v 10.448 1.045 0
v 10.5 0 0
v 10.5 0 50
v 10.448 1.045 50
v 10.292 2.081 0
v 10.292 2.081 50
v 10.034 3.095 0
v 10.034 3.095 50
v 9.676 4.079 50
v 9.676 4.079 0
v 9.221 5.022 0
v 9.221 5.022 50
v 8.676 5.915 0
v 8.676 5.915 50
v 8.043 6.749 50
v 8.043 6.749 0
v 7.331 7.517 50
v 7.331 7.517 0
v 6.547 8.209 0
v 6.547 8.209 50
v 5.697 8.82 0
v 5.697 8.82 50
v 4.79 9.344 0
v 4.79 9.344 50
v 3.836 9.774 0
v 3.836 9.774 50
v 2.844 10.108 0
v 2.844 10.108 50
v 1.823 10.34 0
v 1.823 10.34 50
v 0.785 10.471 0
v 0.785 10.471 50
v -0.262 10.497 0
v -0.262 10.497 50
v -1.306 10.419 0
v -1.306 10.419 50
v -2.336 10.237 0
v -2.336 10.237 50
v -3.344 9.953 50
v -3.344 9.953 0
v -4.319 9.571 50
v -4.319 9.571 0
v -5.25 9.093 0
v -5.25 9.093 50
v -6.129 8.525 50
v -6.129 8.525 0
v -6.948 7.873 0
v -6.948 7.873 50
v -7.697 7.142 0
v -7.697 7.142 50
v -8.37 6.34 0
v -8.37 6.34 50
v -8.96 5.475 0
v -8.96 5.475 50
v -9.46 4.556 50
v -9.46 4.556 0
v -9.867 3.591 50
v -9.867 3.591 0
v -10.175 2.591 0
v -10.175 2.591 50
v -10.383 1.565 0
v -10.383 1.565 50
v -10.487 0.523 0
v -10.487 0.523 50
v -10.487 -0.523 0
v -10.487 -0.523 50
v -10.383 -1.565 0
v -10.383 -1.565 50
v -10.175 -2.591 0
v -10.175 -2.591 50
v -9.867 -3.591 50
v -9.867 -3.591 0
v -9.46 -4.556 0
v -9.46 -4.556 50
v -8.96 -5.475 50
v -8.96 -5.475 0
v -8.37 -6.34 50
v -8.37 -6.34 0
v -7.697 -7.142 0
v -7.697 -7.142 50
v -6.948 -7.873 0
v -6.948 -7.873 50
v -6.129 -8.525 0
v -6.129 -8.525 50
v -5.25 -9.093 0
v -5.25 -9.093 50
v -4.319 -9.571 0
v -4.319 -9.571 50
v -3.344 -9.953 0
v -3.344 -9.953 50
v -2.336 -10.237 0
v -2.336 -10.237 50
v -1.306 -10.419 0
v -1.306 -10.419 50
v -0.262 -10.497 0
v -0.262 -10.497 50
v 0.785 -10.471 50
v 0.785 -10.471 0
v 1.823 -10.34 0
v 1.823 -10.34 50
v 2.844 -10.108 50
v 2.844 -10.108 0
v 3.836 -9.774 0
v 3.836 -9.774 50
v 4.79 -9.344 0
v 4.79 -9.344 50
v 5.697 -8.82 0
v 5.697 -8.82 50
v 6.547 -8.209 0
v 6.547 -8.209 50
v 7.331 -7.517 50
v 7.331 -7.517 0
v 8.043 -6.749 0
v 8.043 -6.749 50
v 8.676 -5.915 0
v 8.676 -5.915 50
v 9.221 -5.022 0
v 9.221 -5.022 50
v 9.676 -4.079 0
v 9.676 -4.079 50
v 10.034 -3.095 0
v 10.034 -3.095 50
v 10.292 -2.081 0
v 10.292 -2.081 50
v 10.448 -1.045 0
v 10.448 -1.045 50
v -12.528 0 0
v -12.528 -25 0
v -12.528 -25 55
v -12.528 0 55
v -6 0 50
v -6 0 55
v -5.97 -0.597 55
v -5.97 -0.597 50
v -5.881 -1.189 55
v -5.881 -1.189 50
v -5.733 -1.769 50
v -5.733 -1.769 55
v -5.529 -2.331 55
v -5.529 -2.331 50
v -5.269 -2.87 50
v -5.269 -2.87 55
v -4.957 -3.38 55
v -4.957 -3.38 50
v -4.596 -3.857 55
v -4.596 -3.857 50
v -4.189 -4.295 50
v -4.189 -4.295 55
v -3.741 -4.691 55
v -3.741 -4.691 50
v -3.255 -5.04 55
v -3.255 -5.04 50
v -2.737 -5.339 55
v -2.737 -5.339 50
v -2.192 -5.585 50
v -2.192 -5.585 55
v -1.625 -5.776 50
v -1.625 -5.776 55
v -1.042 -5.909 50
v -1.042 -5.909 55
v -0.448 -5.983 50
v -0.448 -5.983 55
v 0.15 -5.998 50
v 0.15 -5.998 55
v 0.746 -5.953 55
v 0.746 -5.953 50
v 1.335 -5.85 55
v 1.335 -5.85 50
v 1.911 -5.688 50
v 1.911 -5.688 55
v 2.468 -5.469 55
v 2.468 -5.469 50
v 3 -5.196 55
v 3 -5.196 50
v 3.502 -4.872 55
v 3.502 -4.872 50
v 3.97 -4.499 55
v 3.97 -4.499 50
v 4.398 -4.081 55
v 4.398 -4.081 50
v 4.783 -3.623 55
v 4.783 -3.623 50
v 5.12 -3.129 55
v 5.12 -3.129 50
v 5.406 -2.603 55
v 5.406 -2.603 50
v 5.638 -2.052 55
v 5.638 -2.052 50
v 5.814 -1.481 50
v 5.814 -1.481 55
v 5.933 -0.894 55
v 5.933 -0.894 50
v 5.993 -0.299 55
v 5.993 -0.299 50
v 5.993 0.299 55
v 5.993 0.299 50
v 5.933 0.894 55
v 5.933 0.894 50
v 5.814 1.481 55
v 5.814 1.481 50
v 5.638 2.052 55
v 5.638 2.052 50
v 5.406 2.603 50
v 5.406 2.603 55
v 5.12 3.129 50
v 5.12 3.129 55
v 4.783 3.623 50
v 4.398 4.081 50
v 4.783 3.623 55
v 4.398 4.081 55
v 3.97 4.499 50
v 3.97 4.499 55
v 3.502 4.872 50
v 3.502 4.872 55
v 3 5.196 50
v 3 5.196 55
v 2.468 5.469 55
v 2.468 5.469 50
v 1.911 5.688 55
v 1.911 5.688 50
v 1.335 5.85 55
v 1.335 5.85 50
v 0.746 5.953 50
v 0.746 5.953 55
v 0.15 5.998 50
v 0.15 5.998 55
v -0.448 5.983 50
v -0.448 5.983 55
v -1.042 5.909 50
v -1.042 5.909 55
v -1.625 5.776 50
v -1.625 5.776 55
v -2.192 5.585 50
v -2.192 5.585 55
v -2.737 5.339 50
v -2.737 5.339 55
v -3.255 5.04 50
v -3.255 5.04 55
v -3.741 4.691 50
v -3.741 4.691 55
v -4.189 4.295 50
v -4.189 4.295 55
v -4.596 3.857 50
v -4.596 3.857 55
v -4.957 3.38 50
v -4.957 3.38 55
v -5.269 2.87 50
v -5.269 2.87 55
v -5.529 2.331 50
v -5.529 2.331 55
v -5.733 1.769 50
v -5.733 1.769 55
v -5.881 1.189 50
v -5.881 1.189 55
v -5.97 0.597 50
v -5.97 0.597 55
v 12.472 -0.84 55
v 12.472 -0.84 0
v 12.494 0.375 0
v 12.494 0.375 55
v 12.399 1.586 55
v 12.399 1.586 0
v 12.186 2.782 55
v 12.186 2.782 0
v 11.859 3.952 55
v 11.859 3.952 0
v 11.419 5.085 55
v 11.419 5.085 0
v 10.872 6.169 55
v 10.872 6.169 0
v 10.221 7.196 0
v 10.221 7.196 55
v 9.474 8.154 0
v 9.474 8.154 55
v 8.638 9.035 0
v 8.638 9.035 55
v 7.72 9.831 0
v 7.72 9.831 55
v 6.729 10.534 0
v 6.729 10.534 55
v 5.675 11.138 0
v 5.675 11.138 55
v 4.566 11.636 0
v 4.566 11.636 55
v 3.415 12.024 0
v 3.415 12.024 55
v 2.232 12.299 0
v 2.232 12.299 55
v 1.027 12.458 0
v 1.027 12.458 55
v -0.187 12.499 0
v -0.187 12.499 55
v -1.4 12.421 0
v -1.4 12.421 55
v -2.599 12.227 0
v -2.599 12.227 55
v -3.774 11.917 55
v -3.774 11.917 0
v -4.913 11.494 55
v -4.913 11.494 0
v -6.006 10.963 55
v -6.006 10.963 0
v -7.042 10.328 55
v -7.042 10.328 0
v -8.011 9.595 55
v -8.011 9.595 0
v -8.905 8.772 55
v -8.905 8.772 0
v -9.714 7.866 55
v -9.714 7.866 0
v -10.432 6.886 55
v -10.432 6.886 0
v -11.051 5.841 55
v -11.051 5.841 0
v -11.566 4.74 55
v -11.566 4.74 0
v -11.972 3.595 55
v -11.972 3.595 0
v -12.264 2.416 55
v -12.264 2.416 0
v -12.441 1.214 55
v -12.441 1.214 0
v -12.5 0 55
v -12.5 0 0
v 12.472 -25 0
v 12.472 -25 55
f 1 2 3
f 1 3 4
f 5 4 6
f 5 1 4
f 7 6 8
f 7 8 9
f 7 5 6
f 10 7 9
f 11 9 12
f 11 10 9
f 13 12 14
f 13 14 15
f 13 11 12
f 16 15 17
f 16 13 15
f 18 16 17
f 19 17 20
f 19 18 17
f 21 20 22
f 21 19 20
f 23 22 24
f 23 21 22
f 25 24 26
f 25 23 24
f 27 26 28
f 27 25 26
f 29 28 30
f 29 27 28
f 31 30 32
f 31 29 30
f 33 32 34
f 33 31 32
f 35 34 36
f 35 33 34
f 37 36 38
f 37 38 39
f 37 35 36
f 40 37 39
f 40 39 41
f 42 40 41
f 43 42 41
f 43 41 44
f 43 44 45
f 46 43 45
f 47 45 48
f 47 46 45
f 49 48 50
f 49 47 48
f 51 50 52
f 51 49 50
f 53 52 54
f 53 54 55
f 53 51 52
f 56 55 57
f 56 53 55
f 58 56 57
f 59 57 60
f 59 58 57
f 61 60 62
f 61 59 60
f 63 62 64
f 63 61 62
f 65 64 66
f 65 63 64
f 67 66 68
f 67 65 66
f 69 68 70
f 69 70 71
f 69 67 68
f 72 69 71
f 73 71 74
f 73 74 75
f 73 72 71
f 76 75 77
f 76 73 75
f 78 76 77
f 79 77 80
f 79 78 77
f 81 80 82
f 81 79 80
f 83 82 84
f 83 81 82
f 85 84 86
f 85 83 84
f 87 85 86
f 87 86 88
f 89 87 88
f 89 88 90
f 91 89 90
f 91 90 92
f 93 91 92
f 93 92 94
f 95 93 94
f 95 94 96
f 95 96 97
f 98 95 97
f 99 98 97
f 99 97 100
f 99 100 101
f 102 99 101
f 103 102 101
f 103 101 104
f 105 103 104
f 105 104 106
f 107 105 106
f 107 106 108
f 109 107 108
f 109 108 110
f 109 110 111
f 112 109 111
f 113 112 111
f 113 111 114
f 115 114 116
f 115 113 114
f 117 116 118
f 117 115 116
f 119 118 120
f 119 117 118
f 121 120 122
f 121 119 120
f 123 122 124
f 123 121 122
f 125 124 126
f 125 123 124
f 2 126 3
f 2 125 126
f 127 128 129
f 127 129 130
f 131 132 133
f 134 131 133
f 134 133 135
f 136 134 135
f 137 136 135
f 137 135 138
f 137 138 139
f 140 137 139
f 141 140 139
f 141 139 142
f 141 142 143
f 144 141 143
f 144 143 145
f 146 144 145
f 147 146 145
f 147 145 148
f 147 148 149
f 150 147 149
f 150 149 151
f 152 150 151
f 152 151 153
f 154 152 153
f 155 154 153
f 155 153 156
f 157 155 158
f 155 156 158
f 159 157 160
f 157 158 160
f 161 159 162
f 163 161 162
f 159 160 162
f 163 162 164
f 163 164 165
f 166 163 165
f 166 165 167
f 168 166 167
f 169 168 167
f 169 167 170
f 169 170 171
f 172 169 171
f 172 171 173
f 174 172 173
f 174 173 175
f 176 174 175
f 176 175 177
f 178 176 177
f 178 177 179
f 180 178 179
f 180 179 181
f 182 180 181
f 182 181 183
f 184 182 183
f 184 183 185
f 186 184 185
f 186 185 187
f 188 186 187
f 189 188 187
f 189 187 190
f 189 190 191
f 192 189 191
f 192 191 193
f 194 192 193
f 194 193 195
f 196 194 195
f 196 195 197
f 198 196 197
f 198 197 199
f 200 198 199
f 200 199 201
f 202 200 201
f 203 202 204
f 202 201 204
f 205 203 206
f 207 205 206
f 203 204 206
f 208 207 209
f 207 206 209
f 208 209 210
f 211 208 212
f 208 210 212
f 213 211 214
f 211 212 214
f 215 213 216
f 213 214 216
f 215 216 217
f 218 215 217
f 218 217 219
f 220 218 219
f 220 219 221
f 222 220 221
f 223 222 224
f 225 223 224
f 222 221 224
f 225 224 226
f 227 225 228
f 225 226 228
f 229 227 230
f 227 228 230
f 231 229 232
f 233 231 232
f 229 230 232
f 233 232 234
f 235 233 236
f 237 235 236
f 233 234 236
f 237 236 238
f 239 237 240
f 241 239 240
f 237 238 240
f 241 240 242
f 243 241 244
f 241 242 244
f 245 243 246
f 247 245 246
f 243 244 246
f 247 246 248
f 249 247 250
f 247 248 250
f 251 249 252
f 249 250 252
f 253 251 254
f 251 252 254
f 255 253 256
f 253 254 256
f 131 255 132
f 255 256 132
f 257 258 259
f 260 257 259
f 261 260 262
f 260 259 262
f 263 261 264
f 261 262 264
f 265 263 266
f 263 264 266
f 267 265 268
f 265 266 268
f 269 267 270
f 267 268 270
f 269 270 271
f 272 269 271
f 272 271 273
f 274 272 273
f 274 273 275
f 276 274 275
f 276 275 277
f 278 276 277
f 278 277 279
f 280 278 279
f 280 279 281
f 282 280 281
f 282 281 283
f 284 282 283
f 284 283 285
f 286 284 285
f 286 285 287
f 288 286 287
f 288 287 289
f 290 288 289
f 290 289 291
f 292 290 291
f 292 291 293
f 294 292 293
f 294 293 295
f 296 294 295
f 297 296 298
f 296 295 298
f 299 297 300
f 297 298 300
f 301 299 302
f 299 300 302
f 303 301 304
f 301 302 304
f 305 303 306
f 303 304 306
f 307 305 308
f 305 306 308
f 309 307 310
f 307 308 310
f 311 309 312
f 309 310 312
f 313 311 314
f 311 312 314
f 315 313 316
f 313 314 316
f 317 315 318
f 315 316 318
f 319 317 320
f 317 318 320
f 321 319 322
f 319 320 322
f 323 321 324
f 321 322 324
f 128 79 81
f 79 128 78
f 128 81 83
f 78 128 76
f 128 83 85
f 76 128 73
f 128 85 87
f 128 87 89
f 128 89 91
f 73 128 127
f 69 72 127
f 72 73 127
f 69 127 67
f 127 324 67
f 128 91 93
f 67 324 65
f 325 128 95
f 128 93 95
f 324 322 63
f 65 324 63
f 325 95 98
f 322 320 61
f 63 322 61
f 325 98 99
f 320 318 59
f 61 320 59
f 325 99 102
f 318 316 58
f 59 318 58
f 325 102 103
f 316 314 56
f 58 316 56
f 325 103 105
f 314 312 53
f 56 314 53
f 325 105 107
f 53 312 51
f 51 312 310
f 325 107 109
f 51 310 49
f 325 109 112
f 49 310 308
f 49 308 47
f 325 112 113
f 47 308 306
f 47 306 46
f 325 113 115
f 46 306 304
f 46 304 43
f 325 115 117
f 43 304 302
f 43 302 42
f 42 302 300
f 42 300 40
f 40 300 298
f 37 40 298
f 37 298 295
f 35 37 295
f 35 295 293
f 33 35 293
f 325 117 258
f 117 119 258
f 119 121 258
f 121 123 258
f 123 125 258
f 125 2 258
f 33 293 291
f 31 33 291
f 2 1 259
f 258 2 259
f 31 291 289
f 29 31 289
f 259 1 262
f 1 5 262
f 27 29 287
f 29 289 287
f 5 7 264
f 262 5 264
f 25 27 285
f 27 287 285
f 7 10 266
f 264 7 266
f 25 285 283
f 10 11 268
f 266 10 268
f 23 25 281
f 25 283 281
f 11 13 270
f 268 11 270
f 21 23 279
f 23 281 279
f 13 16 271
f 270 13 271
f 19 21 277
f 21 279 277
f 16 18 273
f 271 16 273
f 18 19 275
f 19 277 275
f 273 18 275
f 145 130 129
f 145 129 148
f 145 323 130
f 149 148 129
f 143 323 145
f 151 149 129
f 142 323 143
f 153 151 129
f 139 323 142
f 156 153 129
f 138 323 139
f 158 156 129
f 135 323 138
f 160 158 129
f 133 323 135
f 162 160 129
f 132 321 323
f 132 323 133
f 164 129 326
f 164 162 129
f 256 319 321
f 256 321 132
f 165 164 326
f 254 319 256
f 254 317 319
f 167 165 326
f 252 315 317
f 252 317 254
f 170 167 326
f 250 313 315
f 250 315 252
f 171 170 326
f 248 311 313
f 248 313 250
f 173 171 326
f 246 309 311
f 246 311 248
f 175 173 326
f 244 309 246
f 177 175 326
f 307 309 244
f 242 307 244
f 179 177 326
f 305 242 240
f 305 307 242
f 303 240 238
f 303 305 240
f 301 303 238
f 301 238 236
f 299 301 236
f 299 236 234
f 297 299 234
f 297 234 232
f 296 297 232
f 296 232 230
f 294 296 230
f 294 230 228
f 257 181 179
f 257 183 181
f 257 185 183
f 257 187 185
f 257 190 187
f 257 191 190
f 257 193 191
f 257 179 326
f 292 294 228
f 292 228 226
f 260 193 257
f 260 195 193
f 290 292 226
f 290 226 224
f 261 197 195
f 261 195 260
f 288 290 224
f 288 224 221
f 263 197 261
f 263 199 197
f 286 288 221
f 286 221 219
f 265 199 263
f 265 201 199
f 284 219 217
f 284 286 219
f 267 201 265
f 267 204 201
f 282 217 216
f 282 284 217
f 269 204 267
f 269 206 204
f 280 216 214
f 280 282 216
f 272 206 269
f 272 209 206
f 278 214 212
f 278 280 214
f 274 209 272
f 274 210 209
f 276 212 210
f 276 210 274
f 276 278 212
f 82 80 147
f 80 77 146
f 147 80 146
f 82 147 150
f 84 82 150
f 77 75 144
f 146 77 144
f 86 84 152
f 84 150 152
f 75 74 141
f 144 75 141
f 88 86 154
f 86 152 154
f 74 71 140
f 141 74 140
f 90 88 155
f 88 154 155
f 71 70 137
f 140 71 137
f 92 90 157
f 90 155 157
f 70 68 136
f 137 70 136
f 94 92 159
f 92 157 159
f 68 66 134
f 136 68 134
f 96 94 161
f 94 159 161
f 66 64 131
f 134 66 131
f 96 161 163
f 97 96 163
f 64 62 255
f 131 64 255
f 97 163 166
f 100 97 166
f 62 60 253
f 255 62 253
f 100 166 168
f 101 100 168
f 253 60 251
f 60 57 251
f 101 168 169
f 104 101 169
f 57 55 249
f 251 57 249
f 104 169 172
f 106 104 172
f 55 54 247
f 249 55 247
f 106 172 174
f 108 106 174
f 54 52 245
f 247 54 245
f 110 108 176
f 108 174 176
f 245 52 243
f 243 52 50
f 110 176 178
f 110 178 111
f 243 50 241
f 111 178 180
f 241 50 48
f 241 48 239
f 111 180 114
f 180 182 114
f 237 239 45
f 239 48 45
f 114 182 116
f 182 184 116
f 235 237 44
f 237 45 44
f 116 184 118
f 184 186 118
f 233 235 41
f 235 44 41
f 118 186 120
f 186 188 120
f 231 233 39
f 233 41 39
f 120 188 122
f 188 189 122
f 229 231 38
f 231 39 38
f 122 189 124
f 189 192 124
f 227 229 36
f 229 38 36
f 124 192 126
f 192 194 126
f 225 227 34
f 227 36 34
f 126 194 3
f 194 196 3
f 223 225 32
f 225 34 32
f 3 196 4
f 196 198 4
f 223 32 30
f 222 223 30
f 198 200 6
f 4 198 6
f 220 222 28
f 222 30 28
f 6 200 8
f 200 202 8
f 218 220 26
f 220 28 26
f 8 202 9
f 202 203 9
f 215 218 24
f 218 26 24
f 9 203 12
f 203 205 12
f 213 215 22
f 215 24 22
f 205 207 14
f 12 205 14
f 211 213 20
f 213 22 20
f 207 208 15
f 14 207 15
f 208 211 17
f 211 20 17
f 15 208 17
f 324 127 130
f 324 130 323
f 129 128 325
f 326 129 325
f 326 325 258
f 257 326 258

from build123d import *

# Parameters (mm, degrees)
F4_R     = 12.5
F0_DEPTH = 55
F1_W     = 25
F1_H     = 25
F5_DEPTH = 55
F2_D     = 12
F7_R     = 10.5
F3_DEPTH = 50


with BuildPart() as f0:
    # F4 (on Top) → F0 (new body)
    with BuildSketch(Plane.XY):
        Circle(F4_R)
    extrude(amount=F0_DEPTH)

    # F1 (on Top) → F5 (join)
    with BuildSketch(Plane.XY):
        with Locations((-0.028275, -12.5)):
            Rectangle(F1_W, F1_H)
    extrude(amount=F5_DEPTH)

    # F2 (through all)
    with Locations(Plane(origin=(0, 0, 0), x_dir=(1, 0, 0), z_dir=(0, 0, -1))):
        with Locations((0, 0)):
            Hole(F2_D / 2)

    # F7 (on Top) → F3 (cut)
    with BuildSketch(Plane.XY):
        Circle(F7_R)
    extrude(amount=F3_DEPTH, mode=Mode.SUBTRACT)


solid = f0.part
